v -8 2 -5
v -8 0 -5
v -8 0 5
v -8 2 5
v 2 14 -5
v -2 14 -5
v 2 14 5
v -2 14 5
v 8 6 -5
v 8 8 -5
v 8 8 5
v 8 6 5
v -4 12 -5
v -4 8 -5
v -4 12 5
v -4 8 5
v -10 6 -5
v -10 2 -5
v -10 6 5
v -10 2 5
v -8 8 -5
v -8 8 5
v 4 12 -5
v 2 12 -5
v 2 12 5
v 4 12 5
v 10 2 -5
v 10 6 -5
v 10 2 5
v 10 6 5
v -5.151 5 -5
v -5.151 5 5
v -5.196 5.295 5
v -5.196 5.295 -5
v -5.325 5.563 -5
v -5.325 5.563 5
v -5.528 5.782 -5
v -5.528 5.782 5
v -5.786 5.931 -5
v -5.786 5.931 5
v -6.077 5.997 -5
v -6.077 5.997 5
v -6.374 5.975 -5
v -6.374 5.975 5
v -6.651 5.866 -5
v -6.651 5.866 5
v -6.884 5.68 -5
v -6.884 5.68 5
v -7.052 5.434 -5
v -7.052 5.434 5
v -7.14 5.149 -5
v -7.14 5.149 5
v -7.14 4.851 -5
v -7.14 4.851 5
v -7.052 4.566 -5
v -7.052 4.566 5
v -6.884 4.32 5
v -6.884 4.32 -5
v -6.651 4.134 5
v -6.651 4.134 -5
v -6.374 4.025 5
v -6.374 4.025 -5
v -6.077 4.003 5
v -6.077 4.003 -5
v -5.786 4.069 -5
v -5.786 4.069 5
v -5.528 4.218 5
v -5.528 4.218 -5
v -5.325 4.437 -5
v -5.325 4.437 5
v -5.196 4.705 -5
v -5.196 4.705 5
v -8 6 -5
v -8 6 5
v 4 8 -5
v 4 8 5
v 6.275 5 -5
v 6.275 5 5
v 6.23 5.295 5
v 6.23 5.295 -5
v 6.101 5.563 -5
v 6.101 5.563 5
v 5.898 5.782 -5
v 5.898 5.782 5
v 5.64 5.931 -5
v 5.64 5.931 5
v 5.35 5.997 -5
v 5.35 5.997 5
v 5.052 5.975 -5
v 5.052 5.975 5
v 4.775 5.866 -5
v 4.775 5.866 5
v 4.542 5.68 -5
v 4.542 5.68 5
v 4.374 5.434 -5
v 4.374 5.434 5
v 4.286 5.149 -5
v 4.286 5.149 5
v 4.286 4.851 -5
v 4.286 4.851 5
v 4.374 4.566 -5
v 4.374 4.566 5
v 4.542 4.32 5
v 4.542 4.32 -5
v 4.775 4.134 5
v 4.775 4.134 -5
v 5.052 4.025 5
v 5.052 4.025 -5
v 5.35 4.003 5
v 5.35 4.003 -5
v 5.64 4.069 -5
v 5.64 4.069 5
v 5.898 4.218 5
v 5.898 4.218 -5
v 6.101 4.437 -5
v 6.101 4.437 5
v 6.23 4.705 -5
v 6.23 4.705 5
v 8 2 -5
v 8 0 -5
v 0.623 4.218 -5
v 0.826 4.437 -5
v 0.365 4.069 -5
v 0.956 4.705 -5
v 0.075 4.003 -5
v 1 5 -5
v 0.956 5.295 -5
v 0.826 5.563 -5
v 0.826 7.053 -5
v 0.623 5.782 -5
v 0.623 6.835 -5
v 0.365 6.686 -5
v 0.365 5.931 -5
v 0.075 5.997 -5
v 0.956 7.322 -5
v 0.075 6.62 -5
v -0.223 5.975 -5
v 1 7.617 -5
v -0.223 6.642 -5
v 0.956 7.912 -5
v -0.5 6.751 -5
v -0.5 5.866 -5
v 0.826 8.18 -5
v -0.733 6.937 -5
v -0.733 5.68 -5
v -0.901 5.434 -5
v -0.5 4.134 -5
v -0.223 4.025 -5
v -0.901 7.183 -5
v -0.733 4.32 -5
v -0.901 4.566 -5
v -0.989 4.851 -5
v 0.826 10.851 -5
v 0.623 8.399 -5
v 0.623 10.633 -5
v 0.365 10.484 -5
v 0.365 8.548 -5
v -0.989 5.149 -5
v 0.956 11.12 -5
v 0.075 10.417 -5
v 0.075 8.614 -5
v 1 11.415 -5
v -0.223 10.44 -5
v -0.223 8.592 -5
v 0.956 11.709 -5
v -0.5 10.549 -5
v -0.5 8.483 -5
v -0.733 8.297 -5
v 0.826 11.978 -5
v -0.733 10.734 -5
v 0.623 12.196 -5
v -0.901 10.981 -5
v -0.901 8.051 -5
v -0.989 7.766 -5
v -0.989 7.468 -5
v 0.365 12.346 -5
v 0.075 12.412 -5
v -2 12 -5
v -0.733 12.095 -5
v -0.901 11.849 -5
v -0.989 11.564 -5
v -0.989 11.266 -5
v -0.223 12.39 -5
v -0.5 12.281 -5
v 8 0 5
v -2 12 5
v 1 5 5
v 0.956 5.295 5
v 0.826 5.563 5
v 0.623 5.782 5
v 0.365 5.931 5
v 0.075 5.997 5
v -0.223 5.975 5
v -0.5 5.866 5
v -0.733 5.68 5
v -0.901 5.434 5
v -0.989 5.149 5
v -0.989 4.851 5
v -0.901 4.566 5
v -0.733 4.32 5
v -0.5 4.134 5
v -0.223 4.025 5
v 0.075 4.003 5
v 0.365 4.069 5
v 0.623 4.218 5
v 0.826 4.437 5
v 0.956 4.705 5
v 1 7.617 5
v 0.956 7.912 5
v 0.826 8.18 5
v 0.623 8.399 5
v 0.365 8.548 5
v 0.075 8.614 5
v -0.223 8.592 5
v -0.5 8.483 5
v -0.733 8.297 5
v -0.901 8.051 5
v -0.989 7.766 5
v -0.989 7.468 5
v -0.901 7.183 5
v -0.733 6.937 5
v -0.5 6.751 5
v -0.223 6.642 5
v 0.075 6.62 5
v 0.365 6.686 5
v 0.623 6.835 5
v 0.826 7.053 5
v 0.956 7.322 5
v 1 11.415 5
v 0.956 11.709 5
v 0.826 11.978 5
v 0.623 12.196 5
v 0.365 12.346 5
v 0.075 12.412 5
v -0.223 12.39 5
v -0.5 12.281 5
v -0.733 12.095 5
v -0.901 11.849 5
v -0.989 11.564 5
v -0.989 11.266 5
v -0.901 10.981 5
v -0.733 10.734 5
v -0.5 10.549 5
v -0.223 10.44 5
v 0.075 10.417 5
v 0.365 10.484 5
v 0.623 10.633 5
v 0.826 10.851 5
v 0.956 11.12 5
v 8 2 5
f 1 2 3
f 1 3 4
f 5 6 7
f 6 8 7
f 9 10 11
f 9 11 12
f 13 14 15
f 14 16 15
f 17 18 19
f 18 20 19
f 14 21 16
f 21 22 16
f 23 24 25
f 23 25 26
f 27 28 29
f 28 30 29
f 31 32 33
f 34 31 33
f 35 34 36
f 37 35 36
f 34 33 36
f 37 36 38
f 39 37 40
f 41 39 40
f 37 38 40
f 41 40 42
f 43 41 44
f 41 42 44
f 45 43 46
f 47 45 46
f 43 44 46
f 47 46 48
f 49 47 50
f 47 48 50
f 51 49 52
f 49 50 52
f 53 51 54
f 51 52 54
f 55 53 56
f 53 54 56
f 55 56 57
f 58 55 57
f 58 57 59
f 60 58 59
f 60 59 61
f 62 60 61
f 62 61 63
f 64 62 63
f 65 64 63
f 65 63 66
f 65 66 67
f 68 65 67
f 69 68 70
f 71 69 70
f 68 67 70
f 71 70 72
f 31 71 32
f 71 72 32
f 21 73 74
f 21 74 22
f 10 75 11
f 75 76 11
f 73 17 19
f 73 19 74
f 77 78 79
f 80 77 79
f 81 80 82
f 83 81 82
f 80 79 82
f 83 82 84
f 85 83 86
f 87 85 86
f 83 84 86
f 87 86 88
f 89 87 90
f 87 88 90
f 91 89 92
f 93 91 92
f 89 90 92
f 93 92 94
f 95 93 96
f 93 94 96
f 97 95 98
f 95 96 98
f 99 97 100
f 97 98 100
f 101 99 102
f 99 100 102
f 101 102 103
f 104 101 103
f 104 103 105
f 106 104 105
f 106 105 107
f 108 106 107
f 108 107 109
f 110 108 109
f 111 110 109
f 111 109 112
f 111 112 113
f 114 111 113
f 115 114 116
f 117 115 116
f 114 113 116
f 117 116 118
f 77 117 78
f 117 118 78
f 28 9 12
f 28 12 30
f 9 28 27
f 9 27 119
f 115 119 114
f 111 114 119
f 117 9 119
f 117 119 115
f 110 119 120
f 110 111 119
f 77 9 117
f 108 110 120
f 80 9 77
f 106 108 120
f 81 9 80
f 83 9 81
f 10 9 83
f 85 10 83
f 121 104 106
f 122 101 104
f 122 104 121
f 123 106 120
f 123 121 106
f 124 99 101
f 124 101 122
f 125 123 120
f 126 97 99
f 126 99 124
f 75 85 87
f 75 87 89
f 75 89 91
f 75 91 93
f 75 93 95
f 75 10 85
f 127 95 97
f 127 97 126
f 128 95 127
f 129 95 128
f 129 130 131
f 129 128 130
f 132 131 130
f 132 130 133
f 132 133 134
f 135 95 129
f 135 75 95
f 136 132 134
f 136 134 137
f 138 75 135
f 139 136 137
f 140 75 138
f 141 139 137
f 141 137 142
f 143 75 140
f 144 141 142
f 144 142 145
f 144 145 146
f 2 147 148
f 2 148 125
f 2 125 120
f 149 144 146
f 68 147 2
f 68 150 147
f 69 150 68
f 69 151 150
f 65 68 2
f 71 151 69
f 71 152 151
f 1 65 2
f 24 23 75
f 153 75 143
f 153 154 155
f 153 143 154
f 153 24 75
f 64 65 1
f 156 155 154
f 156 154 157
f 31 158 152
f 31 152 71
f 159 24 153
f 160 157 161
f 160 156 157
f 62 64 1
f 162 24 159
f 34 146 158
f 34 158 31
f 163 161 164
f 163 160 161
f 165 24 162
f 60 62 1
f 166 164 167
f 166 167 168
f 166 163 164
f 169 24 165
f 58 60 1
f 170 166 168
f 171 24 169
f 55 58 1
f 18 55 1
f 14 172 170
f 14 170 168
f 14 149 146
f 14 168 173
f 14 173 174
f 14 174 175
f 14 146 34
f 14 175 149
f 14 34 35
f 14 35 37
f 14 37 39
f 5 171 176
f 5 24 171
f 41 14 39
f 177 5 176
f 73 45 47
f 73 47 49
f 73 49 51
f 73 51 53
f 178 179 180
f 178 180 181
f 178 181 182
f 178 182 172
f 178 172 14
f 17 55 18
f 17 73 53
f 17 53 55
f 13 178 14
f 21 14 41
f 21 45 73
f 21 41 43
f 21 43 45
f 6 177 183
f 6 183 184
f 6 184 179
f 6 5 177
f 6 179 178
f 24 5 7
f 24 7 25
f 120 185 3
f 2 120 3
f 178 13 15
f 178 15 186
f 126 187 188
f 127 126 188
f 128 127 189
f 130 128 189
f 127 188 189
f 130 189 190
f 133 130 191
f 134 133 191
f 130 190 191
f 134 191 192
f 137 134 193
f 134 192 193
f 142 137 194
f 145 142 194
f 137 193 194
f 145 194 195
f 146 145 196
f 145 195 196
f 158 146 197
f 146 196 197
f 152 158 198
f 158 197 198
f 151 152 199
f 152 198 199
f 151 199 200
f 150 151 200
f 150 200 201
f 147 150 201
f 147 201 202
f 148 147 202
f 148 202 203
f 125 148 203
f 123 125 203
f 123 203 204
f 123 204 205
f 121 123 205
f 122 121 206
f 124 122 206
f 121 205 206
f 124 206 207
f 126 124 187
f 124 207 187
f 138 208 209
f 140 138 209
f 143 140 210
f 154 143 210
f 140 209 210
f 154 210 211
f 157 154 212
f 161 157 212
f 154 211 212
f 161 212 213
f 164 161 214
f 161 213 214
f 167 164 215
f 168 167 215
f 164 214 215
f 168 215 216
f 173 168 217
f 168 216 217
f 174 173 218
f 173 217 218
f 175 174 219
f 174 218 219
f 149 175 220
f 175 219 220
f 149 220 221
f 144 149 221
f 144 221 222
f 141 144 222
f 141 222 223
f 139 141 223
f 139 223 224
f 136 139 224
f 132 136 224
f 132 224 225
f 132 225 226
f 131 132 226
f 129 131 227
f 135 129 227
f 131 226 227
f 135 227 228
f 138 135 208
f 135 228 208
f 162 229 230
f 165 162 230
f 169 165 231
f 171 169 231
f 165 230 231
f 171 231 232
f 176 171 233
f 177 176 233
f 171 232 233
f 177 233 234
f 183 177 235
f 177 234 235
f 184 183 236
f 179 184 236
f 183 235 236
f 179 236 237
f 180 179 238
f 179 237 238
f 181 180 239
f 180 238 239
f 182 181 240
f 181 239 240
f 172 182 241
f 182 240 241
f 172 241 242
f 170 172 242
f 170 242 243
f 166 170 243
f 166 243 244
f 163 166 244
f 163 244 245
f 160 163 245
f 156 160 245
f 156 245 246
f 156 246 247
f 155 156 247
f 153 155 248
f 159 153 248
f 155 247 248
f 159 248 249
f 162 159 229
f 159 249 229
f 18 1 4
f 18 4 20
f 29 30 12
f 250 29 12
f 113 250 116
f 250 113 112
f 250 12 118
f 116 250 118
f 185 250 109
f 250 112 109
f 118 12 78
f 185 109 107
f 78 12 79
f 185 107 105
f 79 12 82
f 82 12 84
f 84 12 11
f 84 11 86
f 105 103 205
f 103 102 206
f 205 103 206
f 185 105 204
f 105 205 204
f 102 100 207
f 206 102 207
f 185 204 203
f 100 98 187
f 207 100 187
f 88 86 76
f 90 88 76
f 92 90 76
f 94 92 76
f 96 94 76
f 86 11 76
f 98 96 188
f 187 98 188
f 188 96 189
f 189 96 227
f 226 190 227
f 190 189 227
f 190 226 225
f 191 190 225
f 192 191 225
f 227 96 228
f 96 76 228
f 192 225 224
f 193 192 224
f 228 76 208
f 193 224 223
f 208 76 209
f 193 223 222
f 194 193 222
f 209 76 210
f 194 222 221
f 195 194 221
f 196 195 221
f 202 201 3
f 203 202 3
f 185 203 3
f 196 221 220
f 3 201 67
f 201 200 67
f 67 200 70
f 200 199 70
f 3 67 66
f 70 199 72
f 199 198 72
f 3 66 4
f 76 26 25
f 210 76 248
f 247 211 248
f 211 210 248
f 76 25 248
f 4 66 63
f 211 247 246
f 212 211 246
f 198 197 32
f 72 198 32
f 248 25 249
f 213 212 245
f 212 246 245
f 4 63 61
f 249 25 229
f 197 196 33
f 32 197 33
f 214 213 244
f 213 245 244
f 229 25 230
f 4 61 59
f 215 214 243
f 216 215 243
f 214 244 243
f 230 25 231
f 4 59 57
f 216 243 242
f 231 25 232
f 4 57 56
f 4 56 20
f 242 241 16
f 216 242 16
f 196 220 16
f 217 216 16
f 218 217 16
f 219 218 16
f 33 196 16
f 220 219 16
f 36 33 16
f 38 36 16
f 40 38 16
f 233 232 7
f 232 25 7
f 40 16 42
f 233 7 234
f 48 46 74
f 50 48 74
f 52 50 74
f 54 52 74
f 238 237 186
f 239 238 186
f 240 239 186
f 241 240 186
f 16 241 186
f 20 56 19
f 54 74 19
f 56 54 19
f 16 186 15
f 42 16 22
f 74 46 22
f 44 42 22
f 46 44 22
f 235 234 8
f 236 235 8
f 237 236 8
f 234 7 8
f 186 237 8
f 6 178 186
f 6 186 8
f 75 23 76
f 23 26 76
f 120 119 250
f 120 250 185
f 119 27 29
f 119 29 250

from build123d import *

# Parameters (mm, degrees)
BOSS_EXTRUDE1_DEPTH = 5
SKETCH2_R           = 1
CUT_EXTRUDE1_DEPTH  = 10


with BuildPart() as part:
    # Sketch1 → Boss-Extrude1 (new, symmetric)
    with BuildSketch(Plane.XY):
        Polygon((-8, 0), (-8, 2), (-10, 2), (-10, 6), (-8, 6), (-8, 8), (-4, 8), (-4, 12), (-2, 12), (-2, 14), (2, 14), (2, 12), (4, 12), (4, 8), (8, 8), (8, 6), (10, 6), (10, 2), (8, 2), (8, 0), align=None)
    extrude(amount=BOSS_EXTRUDE1_DEPTH, both=True)

    # Sketch2 → Cut-Extrude1 (cut)
    with BuildSketch(Plane.XY.offset(5)):
        with Locations((0, 5)):
            Circle(SKETCH2_R)
        with Locations((0, 7.616750923)):
            Circle(SKETCH2_R)
        with Locations((0, 11.414638185)):
            Circle(SKETCH2_R)
        with Locations((-6.151278942, 5)):
            Circle(SKETCH2_R)
        with Locations((5.27484342, 5)):
            Circle(SKETCH2_R)
    extrude(amount=-CUT_EXTRUDE1_DEPTH, mode=Mode.SUBTRACT)


solid = part.part
